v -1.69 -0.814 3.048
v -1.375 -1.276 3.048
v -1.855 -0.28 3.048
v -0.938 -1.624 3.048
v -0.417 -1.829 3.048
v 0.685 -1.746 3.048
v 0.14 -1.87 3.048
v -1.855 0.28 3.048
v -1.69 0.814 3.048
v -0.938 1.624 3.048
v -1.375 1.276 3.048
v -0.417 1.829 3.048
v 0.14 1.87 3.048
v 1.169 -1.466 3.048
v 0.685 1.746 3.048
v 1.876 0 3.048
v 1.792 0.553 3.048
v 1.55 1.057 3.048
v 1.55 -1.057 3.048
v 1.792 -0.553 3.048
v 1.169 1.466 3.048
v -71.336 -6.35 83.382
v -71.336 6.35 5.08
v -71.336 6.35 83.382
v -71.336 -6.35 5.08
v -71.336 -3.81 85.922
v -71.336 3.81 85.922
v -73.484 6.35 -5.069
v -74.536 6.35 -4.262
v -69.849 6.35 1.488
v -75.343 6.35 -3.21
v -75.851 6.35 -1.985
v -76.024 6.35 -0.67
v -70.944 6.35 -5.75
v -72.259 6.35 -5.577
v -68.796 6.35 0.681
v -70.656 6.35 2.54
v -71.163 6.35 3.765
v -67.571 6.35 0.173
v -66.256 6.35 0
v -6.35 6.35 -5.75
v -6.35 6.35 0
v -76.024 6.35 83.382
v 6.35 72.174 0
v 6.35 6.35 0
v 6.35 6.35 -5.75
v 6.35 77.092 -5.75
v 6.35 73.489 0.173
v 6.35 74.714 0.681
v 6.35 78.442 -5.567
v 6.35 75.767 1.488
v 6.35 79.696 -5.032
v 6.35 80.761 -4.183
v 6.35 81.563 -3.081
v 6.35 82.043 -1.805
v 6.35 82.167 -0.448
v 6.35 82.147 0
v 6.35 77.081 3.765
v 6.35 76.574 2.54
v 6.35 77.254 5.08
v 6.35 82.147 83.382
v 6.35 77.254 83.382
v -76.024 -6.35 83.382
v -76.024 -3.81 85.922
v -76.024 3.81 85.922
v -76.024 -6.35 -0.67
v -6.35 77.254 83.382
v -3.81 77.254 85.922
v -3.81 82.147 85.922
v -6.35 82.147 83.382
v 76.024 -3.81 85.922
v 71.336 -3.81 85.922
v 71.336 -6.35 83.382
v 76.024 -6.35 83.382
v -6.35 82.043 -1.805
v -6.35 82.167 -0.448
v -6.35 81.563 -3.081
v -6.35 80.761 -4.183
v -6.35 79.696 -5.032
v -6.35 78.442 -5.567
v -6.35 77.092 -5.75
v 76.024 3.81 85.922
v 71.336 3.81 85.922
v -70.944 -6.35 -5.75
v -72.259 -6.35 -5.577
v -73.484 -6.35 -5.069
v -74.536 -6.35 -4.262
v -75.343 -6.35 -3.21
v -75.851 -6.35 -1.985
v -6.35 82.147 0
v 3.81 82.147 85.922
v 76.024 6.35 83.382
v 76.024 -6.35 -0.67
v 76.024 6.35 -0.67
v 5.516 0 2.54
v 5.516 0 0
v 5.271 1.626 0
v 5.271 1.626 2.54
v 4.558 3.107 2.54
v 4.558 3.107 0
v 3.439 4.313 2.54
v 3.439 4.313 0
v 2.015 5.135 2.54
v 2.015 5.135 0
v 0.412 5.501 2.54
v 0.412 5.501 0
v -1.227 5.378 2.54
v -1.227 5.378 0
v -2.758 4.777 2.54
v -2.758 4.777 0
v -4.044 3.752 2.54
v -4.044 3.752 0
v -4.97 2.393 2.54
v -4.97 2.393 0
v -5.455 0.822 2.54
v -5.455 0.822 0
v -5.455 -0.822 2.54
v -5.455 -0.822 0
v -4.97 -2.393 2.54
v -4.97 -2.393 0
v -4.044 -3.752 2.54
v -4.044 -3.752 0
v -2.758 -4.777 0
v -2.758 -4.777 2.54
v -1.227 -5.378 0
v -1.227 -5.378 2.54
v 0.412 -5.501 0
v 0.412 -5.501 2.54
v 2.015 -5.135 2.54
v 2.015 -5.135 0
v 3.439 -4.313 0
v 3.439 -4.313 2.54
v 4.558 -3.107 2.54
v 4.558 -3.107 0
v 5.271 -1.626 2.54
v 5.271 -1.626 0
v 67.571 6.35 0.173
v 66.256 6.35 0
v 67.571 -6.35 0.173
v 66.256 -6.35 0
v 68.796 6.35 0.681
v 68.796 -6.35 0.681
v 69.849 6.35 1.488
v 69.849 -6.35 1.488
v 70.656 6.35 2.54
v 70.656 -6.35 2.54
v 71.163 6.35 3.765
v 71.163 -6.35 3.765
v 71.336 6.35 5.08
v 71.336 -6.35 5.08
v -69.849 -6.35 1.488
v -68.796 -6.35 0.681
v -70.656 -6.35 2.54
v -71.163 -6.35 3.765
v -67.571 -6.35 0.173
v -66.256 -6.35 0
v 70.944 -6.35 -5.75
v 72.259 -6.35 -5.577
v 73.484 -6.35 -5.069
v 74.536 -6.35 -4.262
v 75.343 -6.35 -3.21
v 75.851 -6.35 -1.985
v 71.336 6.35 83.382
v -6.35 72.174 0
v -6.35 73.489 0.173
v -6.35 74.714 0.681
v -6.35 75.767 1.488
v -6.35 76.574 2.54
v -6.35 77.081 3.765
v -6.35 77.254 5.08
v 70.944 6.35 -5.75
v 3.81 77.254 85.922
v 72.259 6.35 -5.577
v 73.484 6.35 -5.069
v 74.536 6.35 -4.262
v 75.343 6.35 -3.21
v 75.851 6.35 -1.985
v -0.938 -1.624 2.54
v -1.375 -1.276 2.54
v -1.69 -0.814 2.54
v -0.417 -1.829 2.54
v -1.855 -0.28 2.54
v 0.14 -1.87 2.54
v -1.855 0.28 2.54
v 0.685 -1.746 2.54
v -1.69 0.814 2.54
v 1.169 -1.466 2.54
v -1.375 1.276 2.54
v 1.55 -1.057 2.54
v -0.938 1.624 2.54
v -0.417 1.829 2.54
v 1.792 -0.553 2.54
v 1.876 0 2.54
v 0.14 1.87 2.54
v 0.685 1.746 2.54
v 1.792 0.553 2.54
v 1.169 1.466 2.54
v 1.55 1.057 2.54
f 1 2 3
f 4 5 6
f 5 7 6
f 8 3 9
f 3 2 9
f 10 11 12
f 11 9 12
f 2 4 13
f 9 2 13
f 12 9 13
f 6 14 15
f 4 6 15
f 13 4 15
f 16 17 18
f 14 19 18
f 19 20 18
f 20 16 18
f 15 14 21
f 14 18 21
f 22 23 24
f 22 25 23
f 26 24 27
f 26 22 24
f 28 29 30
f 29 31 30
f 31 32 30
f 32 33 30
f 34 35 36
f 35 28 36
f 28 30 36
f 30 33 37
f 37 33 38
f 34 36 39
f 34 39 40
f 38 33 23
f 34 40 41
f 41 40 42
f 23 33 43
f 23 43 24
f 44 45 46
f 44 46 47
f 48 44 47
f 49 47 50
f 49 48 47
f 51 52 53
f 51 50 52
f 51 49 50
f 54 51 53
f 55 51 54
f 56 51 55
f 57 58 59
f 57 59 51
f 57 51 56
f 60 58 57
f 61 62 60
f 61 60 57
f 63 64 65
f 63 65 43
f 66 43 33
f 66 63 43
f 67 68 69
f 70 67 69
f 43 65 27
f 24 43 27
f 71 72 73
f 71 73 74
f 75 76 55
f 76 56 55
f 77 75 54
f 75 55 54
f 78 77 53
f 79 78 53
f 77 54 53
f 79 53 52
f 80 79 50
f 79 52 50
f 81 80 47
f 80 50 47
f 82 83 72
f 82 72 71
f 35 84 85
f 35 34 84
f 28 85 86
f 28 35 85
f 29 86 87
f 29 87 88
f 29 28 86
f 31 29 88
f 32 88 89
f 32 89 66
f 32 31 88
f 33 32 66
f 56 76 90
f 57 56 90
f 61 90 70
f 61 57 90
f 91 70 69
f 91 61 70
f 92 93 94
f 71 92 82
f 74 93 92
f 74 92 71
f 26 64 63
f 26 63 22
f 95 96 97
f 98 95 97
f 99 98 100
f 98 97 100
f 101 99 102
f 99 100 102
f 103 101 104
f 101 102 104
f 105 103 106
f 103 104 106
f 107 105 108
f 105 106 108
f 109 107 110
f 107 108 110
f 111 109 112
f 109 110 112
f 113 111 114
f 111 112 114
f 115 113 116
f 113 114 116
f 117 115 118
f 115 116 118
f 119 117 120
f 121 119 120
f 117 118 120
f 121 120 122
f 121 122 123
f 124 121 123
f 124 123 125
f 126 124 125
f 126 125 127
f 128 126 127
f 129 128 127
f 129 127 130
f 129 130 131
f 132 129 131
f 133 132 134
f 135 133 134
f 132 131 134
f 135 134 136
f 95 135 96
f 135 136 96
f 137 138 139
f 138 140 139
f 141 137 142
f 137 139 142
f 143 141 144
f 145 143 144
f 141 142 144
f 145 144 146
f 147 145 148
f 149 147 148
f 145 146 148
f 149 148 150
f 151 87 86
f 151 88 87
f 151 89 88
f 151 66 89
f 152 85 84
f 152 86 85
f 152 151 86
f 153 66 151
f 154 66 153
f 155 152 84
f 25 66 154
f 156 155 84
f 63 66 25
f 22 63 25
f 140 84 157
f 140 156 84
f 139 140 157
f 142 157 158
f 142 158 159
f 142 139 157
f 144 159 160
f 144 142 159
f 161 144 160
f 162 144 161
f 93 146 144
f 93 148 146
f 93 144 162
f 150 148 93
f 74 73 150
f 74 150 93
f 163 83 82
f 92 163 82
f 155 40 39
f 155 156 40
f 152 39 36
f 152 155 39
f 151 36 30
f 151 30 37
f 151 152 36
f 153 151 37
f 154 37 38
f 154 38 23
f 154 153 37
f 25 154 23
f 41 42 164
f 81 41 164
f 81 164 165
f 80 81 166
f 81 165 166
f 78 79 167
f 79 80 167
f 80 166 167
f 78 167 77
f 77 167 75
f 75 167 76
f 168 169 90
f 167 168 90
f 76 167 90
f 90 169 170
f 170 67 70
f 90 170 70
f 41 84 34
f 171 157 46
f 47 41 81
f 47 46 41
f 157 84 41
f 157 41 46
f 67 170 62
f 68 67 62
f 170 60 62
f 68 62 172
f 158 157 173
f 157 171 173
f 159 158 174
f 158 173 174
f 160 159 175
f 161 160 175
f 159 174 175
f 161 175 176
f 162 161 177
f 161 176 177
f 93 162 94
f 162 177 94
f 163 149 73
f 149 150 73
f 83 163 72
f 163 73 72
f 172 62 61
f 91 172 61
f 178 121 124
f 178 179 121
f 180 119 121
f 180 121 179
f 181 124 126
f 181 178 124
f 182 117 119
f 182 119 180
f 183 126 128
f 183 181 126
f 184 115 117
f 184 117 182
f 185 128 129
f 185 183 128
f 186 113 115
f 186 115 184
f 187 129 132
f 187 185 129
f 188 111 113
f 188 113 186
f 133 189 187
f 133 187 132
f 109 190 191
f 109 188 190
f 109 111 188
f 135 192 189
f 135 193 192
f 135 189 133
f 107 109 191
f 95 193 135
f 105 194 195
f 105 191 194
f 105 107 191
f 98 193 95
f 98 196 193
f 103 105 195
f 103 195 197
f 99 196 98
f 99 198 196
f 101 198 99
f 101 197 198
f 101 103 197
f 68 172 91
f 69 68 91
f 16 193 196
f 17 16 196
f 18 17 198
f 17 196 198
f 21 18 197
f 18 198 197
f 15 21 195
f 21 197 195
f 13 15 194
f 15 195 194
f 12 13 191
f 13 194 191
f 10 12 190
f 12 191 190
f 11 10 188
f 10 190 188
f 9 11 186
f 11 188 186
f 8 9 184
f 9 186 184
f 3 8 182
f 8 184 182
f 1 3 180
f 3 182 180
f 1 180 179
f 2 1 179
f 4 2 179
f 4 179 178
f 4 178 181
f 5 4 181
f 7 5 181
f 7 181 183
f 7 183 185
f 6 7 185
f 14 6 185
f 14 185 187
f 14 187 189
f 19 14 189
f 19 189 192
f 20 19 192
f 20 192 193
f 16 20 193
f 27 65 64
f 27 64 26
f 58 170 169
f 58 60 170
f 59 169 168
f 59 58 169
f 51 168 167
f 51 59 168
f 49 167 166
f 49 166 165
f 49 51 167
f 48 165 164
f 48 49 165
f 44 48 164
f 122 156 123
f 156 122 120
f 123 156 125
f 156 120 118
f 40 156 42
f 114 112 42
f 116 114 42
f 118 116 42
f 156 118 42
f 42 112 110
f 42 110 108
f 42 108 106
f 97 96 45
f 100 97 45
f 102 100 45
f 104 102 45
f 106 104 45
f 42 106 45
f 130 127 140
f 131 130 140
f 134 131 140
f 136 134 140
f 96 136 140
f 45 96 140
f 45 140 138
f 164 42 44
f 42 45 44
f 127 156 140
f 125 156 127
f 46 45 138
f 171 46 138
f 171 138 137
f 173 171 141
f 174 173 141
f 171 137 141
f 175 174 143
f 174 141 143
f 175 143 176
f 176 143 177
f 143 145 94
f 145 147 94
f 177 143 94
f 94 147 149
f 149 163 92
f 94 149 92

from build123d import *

# Parameters (mm, degrees)
F0_W     = 4.6872794628
F0_H     = 85.9219655395
F1_DEPTH = 6.35
F2_W     = 4.8930570483
F2_H     = 85.9219655395
F2_W_2   = 70.9142880514
F2_H_2   = 5.7498048991
F3_DEPTH = 6.35
F4_R     = 5.08
F5_SIZE  = 2.54
F6_R     = 5.5162343309
F6_R_2   = 1.8756395143
F7_DEPTH = 2.54
F8_DEPTH = 3.048


with BuildPart() as f1:
    # F0 (on Front) → F1 (new body, symmetric)
    with BuildSketch(Plane.XZ):
        Polygon((76.0237202048, -5.7498048991), (76.0237202048, 0), (71.336440742, 0), (-71.336440742, 0), (-76.0237202048, 0), (-76.0237202048, -5.7498048991), (0, -5.7498048991), align=None)
        with Locations((-73.6800804734, 42.9609827697)):
            Rectangle(F0_W, F0_H)
        with Locations((73.6800804734, 42.9609827697)):
            Rectangle(F0_W, F0_H)
    extrude(amount=F1_DEPTH, both=True)

    # F2 (on Right) → F3 (join, symmetric)
    with BuildSketch(Plane.YZ):
        with Locations((79.7009654343, 42.9609827697)):
            Rectangle(F2_W, F2_H)
        with Locations((41.7972928844, -2.8749024495)):
            Rectangle(F2_W_2, F2_H_2)
        Polygon((82.1474939585, 0), (77.2544369102, 0), (77.2544369102, -5.7498048991), (82.3985040188, -5.7498048991), align=None)
    extrude(amount=F3_DEPTH, both=True)

    # F4
    f4_edges = [f1.edges().sort_by_distance(p)[0] for p in [
        (0, 77.254437, 0),
        (-71.336441, 0, 0),
        (71.336441, 0, 0),
        (-76.02372, 0, -5.749805),
        (76.02372, 0, -5.749805),
        (0, 82.398504, -5.749805),
    ]]
    fillet(f4_edges, radius=F4_R)

    # F5
    f5_edges = [f1.edges().sort_by_distance(p)[0] for p in [
        (-73.68008, -6.35, 85.921966),
        (-73.68008, 6.35, 85.921966),
        (73.68008, -6.35, 85.921966),
        (73.68008, 6.35, 85.921966),
        (6.35, 79.700965, 85.921966),
        (-6.35, 79.700965, 85.921966),
    ]]
    chamfer(f5_edges, length=F5_SIZE)

    # F6 (on face) → F7 (join)
    with BuildSketch(Plane.XY):
        Circle(F6_R)
        Circle(F6_R_2, mode=Mode.SUBTRACT)
    extrude(amount=F7_DEPTH)

    # F8 (add): a face of the model
    f8_faces = [f1.faces().sort_by_distance(p)[0] for p in [
        (0, 0, 0),
    ]]
    extrude(f8_faces, amount=F8_DEPTH)


solid = f1.part
